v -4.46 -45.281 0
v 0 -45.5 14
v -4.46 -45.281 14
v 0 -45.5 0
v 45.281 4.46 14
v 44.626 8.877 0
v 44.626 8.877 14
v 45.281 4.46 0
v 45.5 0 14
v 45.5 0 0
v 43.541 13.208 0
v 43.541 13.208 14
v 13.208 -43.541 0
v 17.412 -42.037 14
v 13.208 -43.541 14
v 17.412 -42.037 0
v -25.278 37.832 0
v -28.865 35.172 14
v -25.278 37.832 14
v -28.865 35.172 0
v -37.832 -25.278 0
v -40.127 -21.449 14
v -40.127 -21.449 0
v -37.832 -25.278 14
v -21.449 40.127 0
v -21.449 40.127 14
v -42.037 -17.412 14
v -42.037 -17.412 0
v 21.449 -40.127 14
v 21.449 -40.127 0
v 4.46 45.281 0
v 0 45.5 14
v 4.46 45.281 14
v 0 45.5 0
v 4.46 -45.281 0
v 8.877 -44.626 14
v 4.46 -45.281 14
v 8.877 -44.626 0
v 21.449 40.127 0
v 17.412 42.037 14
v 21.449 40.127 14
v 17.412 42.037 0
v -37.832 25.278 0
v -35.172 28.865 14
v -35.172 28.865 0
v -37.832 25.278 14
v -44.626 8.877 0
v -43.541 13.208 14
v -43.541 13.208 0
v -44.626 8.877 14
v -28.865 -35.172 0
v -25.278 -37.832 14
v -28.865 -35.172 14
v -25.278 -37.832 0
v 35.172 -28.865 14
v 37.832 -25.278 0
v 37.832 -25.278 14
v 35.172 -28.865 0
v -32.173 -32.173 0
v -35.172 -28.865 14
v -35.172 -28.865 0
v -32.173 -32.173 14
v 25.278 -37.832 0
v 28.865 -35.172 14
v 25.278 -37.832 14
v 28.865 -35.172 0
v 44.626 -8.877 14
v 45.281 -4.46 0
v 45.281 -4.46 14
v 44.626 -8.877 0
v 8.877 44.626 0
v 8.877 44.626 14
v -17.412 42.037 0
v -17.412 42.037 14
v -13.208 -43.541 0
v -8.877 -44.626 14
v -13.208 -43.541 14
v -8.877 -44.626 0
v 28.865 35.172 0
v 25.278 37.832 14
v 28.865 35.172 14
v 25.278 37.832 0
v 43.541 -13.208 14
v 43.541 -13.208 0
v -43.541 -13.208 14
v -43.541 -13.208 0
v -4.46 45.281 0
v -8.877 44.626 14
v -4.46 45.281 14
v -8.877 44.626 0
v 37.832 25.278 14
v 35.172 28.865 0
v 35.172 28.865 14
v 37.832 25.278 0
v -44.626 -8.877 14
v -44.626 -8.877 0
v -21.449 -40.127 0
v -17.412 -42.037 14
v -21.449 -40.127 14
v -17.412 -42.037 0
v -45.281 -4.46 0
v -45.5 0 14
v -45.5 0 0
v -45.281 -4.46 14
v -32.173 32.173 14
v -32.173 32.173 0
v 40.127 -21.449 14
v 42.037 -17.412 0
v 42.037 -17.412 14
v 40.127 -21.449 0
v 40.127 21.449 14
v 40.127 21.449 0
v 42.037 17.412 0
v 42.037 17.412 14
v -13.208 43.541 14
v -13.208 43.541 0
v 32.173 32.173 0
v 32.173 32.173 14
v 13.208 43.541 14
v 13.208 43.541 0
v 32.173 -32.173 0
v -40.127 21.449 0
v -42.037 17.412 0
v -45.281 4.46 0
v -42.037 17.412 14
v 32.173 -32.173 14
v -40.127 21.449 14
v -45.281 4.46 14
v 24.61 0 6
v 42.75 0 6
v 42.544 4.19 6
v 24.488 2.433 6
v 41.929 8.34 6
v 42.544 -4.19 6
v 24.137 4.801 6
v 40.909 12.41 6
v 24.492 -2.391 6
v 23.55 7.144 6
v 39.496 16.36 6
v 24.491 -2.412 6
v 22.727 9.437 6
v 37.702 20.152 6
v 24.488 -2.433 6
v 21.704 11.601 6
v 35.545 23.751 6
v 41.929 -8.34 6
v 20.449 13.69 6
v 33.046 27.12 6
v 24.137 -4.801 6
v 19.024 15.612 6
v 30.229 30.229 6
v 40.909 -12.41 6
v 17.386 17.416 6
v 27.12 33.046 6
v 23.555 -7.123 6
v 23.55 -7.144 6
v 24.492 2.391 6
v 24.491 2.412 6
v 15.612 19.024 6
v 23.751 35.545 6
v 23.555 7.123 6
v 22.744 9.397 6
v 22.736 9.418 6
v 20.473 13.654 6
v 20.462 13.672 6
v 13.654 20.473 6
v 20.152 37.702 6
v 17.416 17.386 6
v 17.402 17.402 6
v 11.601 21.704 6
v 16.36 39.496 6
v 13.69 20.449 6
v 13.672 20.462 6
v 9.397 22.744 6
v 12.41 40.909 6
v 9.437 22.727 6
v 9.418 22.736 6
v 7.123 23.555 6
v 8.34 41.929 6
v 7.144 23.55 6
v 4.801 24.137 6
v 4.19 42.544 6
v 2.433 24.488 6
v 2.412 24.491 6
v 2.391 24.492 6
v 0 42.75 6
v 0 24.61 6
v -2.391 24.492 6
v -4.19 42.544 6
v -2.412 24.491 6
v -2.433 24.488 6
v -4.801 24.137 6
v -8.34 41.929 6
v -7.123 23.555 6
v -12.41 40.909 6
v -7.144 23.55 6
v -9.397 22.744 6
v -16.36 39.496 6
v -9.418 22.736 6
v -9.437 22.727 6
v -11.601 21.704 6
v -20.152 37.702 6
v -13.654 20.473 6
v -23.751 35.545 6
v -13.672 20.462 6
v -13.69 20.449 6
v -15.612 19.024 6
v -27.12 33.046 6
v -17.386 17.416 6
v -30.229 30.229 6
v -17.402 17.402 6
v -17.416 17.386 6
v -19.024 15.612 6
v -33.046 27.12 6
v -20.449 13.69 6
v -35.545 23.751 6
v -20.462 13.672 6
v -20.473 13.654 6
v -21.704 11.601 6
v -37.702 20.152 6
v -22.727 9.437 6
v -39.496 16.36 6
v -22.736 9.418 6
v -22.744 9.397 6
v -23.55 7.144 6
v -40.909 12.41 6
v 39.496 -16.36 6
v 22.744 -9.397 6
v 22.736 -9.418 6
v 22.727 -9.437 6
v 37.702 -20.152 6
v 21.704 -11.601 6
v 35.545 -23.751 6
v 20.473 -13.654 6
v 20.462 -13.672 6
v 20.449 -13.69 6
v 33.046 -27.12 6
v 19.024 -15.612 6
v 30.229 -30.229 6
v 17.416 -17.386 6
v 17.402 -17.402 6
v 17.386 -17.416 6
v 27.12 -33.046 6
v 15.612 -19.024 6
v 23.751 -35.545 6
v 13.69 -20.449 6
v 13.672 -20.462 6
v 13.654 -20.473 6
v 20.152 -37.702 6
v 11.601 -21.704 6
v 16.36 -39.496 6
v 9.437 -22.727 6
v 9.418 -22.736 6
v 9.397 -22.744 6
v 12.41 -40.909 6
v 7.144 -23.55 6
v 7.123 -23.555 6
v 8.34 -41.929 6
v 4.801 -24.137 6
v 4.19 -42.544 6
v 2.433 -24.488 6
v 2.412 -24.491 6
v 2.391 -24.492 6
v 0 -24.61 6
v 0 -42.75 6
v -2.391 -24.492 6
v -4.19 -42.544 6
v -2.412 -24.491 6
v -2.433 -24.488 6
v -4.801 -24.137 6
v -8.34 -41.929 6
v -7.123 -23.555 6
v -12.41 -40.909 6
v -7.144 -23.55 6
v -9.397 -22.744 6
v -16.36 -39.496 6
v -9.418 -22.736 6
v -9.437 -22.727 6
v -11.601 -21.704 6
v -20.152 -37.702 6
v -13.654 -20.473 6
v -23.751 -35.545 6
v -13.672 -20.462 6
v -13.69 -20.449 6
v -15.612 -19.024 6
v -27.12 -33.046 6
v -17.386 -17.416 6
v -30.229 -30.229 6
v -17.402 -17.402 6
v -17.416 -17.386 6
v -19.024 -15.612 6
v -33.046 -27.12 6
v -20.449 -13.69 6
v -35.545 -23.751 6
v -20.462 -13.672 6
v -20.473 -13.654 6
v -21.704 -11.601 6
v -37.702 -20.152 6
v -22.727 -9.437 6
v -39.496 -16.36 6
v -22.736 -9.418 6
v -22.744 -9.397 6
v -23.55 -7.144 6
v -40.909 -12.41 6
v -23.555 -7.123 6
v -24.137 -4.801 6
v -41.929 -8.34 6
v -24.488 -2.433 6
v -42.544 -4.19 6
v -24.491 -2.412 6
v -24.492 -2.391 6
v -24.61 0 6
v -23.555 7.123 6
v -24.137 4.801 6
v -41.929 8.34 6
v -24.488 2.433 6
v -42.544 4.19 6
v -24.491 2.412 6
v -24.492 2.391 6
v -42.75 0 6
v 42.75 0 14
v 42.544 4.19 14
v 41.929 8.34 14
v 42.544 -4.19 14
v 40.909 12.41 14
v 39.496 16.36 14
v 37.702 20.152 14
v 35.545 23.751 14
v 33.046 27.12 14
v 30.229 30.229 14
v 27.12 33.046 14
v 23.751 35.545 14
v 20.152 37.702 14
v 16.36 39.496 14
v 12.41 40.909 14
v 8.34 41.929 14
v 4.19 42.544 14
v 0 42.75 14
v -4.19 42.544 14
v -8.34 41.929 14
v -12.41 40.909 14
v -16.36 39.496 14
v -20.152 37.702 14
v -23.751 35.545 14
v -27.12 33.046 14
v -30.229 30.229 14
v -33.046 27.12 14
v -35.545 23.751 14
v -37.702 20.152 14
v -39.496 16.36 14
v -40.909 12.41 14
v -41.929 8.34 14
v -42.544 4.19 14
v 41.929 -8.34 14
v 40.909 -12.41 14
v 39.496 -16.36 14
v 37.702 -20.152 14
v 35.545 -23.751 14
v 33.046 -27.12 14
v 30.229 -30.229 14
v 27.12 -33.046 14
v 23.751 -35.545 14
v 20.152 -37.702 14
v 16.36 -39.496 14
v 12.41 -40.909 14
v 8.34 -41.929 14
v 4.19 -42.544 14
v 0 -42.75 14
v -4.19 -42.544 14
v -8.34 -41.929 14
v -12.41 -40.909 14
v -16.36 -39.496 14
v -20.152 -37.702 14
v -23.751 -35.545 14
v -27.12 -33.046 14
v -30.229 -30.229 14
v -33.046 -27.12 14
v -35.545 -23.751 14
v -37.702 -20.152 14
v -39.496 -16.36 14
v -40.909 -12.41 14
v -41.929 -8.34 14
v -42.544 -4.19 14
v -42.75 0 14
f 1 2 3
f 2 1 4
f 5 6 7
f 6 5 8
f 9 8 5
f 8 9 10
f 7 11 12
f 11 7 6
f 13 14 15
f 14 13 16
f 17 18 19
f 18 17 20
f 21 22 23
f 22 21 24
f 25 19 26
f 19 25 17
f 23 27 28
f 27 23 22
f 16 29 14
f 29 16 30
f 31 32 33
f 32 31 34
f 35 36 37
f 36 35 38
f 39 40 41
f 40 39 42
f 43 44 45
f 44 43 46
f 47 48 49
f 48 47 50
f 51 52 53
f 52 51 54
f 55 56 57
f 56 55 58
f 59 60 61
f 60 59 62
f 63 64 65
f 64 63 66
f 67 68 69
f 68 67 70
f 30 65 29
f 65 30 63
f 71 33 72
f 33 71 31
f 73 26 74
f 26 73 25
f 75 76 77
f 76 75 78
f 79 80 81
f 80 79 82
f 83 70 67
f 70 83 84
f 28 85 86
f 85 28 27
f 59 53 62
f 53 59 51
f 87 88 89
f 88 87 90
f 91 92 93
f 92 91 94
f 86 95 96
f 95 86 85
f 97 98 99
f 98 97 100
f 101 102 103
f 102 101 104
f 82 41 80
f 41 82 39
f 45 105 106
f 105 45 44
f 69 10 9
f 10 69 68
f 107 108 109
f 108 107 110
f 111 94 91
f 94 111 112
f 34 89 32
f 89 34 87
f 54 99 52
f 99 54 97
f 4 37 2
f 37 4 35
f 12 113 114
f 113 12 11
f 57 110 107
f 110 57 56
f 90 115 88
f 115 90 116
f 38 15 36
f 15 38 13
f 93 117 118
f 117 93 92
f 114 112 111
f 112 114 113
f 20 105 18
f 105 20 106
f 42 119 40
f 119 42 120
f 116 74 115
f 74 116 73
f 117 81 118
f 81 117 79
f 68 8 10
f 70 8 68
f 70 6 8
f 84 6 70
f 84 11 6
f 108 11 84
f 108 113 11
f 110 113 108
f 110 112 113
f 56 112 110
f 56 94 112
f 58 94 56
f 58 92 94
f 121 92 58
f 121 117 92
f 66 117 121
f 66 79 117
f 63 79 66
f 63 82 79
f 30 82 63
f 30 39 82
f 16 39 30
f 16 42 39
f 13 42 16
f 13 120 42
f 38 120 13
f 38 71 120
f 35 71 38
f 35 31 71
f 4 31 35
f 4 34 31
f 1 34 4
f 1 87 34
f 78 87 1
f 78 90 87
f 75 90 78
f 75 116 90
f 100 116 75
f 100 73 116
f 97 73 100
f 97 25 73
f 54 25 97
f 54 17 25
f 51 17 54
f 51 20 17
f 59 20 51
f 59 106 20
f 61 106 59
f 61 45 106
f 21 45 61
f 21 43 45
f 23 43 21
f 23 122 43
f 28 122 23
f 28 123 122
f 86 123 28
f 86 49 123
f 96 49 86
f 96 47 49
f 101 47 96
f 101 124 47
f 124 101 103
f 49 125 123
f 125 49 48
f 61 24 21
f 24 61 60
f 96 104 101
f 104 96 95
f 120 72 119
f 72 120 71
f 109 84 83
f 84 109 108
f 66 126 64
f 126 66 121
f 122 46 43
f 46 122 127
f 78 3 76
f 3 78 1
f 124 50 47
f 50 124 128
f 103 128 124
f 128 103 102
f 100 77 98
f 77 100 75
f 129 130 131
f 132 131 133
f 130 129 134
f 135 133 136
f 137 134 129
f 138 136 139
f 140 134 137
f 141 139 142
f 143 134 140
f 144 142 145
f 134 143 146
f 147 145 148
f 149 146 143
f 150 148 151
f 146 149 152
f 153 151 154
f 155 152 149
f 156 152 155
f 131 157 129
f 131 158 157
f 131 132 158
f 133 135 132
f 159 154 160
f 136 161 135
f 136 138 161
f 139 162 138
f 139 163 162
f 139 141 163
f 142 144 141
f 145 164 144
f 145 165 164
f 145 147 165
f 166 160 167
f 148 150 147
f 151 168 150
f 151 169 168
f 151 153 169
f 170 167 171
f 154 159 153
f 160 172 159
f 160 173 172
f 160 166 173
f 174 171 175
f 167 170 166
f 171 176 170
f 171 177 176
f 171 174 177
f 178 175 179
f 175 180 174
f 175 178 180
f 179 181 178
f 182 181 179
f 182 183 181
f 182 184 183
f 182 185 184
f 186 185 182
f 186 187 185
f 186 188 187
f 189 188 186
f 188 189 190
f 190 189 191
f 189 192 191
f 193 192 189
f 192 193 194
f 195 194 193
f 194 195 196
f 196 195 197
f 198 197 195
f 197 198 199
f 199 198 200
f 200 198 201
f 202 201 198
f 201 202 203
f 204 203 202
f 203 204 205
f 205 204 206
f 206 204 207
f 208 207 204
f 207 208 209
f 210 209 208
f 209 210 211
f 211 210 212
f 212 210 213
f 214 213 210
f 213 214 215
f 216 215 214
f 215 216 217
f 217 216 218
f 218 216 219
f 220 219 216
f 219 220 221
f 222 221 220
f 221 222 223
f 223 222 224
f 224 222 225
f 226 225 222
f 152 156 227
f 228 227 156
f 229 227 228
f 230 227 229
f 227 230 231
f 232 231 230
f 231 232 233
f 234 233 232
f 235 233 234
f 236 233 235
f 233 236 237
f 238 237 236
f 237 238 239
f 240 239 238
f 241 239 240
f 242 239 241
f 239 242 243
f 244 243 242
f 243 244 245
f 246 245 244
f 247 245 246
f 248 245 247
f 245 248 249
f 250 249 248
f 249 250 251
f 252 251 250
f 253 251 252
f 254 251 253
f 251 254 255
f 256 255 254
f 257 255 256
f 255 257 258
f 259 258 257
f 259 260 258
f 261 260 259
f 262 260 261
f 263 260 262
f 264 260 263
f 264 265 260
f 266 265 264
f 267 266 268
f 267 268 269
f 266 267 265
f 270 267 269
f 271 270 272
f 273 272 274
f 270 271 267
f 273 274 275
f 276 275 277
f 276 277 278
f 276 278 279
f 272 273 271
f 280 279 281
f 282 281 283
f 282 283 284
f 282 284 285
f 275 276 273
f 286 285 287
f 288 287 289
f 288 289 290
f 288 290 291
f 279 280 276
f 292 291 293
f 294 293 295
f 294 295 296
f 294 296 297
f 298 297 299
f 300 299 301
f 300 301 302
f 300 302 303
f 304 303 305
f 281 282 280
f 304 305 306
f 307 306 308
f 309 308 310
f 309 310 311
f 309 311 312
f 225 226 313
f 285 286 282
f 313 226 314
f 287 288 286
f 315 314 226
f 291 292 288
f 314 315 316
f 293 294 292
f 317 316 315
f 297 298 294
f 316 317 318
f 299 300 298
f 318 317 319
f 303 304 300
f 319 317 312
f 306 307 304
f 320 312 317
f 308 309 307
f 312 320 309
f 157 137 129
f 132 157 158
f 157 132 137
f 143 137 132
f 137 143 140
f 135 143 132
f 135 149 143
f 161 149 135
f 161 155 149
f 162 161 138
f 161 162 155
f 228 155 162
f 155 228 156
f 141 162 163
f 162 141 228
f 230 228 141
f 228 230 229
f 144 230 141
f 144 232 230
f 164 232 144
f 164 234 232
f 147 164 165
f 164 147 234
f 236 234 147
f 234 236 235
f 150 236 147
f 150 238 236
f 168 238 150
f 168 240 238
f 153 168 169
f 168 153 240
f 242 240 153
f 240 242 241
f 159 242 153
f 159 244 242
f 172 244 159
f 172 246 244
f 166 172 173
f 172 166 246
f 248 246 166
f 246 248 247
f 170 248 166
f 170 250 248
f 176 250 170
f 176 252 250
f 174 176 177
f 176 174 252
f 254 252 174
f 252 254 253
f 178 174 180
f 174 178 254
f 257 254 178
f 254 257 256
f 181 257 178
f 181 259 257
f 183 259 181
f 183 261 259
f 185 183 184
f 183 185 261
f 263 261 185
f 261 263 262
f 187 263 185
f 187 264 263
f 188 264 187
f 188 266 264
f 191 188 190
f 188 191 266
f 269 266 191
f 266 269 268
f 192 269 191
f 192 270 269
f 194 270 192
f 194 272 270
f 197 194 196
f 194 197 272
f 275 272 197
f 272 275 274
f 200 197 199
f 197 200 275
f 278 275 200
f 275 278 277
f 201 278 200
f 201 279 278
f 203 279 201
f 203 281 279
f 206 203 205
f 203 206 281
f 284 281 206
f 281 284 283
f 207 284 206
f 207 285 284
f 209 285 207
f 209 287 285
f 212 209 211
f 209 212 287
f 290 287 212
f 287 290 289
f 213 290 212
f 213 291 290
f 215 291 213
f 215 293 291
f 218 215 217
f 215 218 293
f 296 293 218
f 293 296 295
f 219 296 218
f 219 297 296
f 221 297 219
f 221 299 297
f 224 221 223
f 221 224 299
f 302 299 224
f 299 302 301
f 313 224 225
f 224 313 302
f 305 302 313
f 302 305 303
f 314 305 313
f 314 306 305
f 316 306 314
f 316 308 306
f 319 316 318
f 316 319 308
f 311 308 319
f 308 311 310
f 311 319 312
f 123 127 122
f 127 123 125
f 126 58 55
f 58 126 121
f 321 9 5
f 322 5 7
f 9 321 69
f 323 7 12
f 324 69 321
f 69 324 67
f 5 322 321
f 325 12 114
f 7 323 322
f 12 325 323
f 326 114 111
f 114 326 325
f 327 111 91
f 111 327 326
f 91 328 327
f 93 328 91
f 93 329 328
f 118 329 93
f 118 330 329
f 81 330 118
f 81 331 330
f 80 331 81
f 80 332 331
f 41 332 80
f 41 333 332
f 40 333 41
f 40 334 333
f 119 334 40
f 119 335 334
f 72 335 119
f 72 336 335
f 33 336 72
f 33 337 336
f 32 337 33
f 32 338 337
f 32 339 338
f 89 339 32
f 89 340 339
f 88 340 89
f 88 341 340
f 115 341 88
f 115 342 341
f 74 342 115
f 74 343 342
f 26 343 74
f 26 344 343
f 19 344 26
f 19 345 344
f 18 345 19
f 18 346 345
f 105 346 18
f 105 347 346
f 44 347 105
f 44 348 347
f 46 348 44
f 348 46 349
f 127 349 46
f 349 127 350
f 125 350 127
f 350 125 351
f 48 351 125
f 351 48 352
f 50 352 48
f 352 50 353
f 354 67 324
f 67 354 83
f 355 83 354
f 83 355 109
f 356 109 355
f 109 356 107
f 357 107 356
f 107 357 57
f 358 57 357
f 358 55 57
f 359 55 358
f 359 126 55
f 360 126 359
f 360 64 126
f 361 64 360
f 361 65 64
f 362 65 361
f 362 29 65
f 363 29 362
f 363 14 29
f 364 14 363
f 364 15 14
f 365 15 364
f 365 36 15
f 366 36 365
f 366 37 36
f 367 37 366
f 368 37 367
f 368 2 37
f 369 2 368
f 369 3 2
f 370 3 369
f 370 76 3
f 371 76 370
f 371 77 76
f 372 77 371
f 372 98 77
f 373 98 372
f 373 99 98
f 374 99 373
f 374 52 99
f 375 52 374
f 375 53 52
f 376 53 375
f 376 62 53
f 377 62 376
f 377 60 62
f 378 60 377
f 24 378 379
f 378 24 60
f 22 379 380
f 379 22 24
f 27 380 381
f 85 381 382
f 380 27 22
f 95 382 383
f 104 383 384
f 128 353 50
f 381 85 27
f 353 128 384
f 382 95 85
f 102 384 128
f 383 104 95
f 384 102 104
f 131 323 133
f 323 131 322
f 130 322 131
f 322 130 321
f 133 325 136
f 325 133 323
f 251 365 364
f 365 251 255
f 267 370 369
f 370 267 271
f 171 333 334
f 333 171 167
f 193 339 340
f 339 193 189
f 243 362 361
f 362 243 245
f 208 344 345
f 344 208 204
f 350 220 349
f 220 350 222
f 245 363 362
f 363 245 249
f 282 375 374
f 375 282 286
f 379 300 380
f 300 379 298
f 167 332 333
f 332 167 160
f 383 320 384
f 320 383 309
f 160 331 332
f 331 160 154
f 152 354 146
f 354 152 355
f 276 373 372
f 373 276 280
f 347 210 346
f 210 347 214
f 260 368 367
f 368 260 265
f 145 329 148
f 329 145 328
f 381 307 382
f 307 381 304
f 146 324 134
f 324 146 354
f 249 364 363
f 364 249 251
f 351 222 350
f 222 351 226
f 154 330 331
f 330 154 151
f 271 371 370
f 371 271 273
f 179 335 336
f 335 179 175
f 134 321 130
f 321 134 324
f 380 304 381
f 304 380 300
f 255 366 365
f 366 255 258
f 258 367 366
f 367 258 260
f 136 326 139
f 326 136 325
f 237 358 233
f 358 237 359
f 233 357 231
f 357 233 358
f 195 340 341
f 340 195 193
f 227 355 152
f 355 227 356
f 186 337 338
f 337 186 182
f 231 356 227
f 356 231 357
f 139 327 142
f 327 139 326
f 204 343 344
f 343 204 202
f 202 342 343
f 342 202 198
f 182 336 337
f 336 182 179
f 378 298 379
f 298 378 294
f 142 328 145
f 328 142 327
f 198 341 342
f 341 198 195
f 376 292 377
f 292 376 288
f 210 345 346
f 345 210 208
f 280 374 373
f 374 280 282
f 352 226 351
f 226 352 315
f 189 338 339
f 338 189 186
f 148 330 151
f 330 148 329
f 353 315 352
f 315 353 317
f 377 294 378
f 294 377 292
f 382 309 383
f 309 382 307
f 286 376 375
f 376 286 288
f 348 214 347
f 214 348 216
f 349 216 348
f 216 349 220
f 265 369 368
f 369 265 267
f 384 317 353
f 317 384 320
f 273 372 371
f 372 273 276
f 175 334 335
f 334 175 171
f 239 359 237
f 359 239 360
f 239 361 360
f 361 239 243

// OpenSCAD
// Cherry Pit Lid - sits on a standard coffee mug, hole in center for pits
// Mug outer rim ~85mm diameter

$fn = 64;

// Dimensions
mug_od      = 85;    // mug outer rim diameter
wall        = 3;     // lid wall thickness
rim_depth   = 8;     // how deep the lid drops over the mug rim
lid_height  = 6;     // thickness of the flat lid top
pit_hole_d  = 18;    // center hole diameter (cherry pit passes through)
funnel_depth = 4;    // depth of funnel recess around hole
bowl_d      = 50;    // diameter of the finger bowl / rest area

// Outer shell that drops over the mug rim
module mug_collar() {
    difference() {
        // Outer cylinder
        cylinder(d = mug_od + wall*2, h = rim_depth + lid_height);
        // Inner bore that fits over mug rim
        translate([0, 0, lid_height])
            cylinder(d = mug_od + 0.5, h = rim_depth + 0.1); // 0.5mm clearance
    }
}

// Flat top with funnel and pit hole
module lid_top() {
    difference() {
        cylinder(d = mug_od + wall*2, h = lid_height);

        // Funnel recess: shallow bowl around the pit hole
        translate([0, 0, lid_height - funnel_depth])
            cylinder(d1 = pit_hole_d, d2 = bowl_d, h = funnel_depth + 0.1);

        // Pit hole through the lid
        cylinder(d = pit_hole_d, h = lid_height + 0.1);
    }
}

union() {
    lid_top();
    mug_collar();
}
